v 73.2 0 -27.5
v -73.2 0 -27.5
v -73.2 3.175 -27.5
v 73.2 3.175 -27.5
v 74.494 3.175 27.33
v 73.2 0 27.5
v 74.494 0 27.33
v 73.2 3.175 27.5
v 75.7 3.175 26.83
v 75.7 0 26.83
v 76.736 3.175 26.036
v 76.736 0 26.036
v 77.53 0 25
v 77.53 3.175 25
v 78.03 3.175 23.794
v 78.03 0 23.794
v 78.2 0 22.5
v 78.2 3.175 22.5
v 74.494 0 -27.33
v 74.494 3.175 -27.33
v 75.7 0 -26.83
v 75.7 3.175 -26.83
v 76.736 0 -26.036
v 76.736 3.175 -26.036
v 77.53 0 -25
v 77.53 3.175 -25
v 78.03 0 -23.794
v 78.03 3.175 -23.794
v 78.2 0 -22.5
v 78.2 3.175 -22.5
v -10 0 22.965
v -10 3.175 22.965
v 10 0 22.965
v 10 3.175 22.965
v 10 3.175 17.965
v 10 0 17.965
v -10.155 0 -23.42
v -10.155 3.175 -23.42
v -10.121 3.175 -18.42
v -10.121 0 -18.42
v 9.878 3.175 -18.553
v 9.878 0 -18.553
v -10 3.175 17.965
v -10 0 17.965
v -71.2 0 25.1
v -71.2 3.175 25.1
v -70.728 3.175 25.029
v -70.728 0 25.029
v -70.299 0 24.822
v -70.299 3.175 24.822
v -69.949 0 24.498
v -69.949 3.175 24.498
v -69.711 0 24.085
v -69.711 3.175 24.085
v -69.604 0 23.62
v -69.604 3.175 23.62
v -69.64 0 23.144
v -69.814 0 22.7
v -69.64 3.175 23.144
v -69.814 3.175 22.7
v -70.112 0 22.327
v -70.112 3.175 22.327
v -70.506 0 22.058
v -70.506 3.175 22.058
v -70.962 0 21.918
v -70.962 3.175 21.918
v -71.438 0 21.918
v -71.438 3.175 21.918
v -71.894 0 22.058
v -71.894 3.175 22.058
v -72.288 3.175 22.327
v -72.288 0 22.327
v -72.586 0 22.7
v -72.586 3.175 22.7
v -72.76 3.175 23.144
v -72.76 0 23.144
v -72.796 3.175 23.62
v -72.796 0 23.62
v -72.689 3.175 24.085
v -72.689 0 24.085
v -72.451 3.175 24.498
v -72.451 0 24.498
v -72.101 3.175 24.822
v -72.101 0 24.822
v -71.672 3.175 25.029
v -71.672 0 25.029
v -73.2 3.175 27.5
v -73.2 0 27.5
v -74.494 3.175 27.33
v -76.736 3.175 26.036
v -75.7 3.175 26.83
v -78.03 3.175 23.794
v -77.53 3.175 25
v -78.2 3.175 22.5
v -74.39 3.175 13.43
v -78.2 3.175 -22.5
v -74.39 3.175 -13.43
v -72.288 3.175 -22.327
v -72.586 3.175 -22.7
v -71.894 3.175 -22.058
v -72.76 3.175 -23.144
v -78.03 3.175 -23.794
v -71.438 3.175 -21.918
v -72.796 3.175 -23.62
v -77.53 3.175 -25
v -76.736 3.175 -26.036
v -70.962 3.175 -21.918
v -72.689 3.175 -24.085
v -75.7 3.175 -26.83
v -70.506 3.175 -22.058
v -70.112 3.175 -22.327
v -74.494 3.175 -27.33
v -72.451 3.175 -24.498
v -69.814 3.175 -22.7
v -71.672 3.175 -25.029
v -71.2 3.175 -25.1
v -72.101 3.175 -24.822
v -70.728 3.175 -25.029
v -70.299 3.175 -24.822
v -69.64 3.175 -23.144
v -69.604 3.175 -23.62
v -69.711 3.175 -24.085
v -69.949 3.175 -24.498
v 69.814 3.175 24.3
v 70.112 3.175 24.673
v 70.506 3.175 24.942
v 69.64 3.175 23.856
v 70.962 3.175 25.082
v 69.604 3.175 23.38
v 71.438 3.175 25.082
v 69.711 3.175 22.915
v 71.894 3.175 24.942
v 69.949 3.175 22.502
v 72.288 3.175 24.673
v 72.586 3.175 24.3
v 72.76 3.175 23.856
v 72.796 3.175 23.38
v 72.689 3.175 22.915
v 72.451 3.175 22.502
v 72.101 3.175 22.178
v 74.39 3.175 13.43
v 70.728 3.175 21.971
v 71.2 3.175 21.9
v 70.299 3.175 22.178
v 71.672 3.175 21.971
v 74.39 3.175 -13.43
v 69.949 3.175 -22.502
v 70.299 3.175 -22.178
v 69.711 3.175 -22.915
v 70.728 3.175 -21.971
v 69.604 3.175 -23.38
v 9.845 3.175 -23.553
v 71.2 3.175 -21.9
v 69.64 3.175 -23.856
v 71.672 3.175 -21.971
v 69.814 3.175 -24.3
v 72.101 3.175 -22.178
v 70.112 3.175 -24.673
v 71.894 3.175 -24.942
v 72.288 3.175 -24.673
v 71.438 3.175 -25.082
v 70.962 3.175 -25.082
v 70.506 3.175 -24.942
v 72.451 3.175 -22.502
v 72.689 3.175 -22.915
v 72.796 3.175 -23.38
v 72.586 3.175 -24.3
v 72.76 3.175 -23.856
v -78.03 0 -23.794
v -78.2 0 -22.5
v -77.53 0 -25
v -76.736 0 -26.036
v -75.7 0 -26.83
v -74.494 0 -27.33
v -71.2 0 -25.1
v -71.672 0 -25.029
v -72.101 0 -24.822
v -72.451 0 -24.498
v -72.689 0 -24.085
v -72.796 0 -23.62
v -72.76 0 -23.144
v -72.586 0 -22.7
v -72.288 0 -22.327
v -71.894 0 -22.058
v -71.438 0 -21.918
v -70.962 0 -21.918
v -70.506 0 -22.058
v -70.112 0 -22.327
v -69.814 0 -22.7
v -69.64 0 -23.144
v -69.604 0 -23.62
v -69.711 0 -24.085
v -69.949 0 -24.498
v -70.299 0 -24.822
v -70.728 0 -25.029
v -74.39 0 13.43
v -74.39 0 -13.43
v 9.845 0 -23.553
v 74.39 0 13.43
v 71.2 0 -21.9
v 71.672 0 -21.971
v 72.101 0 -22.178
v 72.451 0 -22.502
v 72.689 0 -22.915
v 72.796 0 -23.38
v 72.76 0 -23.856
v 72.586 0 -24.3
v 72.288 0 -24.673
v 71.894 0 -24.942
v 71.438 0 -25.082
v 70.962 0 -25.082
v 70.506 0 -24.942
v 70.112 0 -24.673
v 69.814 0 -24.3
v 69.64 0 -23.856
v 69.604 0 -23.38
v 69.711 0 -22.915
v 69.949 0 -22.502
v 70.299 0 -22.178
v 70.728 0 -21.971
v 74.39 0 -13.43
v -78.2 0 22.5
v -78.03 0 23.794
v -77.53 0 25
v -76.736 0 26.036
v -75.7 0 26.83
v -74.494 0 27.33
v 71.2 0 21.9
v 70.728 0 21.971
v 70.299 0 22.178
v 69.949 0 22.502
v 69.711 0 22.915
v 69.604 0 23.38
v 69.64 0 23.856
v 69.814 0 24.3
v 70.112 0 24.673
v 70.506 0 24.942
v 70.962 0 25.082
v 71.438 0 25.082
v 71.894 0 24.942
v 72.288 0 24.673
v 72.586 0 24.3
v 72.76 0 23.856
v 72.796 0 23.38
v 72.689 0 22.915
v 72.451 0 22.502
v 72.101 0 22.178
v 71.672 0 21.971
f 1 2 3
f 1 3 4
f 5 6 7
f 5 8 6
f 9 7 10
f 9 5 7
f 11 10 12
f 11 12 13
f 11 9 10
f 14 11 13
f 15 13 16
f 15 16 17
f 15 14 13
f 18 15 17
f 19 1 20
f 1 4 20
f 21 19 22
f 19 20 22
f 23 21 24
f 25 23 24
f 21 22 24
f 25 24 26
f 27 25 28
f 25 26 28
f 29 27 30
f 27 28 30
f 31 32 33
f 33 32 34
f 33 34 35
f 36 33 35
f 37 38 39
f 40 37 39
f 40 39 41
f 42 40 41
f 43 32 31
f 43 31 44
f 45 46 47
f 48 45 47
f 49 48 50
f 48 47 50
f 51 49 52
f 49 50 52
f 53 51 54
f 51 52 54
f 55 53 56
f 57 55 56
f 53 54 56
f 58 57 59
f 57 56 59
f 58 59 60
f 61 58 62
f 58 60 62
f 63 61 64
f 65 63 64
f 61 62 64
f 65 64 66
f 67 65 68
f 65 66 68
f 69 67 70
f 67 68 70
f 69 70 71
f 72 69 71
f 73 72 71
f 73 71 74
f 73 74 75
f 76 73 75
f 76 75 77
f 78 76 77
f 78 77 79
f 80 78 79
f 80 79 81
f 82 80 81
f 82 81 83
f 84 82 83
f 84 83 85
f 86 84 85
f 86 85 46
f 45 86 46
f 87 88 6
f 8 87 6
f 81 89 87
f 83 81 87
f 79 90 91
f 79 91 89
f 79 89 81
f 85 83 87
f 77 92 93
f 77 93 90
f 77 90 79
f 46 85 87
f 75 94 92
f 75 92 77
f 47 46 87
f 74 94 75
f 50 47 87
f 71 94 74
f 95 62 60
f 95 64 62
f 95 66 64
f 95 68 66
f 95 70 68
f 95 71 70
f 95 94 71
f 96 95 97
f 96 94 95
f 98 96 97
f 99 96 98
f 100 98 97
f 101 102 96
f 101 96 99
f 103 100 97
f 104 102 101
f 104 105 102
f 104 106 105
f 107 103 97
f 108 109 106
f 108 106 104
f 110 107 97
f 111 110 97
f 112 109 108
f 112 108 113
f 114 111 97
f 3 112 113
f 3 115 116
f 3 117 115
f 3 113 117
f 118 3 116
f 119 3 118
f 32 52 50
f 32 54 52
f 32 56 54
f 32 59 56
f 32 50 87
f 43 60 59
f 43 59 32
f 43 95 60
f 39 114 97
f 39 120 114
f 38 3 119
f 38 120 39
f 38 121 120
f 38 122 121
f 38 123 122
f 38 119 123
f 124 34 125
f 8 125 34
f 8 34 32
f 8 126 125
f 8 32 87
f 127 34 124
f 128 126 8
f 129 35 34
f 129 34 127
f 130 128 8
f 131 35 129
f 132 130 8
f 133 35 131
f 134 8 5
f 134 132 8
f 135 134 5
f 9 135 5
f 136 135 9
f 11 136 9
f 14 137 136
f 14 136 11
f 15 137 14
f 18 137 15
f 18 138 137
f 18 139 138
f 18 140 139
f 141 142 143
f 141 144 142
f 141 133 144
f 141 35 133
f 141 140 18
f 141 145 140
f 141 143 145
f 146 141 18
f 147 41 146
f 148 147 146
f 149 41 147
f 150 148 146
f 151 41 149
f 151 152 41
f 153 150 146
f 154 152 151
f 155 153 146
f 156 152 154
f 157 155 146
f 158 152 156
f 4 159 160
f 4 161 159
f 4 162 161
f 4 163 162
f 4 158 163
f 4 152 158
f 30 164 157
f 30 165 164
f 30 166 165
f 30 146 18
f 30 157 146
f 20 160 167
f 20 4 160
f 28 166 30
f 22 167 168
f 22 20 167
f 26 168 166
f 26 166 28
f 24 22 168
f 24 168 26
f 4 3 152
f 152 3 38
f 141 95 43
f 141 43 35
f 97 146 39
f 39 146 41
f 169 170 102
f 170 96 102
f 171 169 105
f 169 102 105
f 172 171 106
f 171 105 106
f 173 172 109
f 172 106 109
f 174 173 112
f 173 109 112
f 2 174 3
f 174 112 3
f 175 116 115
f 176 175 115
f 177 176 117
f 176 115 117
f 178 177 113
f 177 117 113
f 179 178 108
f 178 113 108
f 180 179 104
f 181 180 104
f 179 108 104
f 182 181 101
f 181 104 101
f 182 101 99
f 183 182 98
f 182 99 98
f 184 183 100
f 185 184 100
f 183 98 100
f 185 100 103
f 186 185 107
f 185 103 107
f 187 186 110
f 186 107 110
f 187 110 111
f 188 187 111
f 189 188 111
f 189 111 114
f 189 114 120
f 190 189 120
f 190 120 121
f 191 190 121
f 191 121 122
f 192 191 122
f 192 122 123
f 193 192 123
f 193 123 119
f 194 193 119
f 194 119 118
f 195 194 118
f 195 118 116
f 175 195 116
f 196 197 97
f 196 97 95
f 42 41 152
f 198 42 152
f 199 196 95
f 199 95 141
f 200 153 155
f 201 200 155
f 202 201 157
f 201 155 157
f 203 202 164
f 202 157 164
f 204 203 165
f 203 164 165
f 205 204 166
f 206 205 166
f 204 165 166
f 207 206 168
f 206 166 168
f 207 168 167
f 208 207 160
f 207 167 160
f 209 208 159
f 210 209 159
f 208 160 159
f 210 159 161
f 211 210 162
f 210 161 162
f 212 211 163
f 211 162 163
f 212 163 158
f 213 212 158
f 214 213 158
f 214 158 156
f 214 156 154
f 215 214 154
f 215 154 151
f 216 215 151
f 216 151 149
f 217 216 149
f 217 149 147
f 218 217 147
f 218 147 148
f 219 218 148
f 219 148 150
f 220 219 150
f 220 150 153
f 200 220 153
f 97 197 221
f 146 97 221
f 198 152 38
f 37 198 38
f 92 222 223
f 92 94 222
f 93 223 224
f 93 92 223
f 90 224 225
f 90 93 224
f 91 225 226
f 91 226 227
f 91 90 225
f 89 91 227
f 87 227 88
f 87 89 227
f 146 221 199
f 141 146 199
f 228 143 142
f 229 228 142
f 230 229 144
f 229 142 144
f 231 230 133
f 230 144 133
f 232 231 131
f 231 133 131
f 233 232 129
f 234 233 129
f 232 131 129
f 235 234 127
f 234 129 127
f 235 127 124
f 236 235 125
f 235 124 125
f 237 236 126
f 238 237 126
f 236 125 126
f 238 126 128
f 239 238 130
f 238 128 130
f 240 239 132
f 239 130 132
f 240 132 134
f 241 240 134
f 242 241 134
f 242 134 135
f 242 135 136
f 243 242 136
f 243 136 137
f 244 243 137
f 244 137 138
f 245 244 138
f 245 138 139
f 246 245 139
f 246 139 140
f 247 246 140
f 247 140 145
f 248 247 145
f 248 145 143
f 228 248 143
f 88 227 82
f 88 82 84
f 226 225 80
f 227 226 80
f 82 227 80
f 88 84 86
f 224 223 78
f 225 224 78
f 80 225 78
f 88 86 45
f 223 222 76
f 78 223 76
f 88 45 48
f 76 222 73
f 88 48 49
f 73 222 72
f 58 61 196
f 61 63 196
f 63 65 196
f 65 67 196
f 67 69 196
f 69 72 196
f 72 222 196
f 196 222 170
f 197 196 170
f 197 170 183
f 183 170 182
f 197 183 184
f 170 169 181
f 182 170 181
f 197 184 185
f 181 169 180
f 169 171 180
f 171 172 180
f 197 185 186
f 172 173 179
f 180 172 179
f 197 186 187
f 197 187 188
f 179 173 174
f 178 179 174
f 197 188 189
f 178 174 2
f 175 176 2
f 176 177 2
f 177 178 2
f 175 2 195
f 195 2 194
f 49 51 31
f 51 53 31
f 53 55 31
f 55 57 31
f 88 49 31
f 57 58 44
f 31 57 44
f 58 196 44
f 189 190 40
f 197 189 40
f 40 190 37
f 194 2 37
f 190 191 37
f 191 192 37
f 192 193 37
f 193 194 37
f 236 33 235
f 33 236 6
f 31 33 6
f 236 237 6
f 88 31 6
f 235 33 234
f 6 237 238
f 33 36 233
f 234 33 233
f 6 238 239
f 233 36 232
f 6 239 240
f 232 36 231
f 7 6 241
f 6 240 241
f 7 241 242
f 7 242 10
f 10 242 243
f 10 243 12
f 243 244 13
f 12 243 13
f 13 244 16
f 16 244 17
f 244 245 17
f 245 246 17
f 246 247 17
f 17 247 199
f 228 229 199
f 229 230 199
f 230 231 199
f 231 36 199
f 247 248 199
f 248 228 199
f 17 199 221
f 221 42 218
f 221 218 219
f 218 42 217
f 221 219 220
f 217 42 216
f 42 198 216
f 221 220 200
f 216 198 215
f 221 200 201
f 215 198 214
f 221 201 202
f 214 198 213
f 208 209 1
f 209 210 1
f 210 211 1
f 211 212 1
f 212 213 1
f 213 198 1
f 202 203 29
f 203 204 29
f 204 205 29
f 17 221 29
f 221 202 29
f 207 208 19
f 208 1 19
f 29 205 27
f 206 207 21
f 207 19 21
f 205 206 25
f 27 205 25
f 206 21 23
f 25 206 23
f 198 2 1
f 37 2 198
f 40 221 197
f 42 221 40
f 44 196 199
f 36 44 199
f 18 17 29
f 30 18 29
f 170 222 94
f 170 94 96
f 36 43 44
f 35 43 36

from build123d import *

# Parameters (mm, degrees)
SKETCH2_W           = 156.4
SKETCH2_H           = 55
BOSS_EXTRUDE1_DEPTH = 3.175
SKETCH3_W           = 148.78
SKETCH3_H           = 26.86
CUT_EXTRUDE1_DEPTH  = 83.955232656
SKETCH4_R           = 1.6
CUT_EXTRUDE2_DEPTH  = 83.955232656
SKETCH5_W           = 20
SKETCH5_H           = 5
CUT_EXTRUDE3_DEPTH  = 83.955232656
FILLET1_R           = 5
FILLET2_R           = 5


with BuildPart() as part:
    # Sketch2 → Boss-Extrude1 (new body)
    with BuildSketch(Plane(origin=(0, 0, 0), x_dir=(1, 0, 0), z_dir=(0, 1, 0))):
        Rectangle(SKETCH2_W, SKETCH2_H)
    extrude(amount=BOSS_EXTRUDE1_DEPTH)

    # Sketch3 → Cut-Extrude1 (cut, through all)
    with BuildSketch(Plane.XZ):
        Rectangle(SKETCH3_W, SKETCH3_H)
    extrude(amount=-CUT_EXTRUDE1_DEPTH, mode=Mode.SUBTRACT)

    # Sketch4 → Cut-Extrude2 (cut, through all)
    with BuildSketch(Plane(origin=(0, 3.175, 0), x_dir=(1, 0, 0), z_dir=(0, 1, 0))):
        with Locations(Location((-71.2, -23.5, 0), (0, 0, 270))):
            Circle(SKETCH4_R)
        with Locations(Location((-71.2, 23.5, 0), (0, 0, 90))):
            Circle(SKETCH4_R)
        with Locations(Location((71.2, 23.5, 0), (0, 0, 270))):
            Circle(SKETCH4_R)
        with Locations(Location((71.2, -23.5, 0), (0, 0, 90))):
            Circle(SKETCH4_R)
    extrude(amount=-CUT_EXTRUDE2_DEPTH, mode=Mode.SUBTRACT)

    # Sketch5 → Cut-Extrude3 (cut, through all)
    with BuildSketch(Plane(origin=(0, 3.175, 0), x_dir=(1, 0, 0), z_dir=(0, 1, 0))):
        with Locations((0, -20.465)):
            Rectangle(SKETCH5_W, SKETCH5_H)
        Polygon((-10.154798185, 23.41968691), (-10.121425865, 18.419798282), (9.878128645, 18.553287562), (9.844756325, 23.553176189), align=None)
    extrude(amount=-CUT_EXTRUDE3_DEPTH, mode=Mode.SUBTRACT)

    # Fillet1
    fillet1_edges = [part.edges().sort_by_distance(p)[0] for p in [
        (78.2, 1.5875, 27.5),
        (-78.2, 1.5875, 27.5),
        (-78.2, 1.5875, -27.5),
    ]]
    fillet(fillet1_edges, radius=FILLET1_R)

    # Fillet2
    fillet2_edges = [part.edges().sort_by_distance(p)[0] for p in [
        (78.2, 1.5875, -27.5),
    ]]
    fillet(fillet2_edges, radius=FILLET2_R)


solid = part.part
